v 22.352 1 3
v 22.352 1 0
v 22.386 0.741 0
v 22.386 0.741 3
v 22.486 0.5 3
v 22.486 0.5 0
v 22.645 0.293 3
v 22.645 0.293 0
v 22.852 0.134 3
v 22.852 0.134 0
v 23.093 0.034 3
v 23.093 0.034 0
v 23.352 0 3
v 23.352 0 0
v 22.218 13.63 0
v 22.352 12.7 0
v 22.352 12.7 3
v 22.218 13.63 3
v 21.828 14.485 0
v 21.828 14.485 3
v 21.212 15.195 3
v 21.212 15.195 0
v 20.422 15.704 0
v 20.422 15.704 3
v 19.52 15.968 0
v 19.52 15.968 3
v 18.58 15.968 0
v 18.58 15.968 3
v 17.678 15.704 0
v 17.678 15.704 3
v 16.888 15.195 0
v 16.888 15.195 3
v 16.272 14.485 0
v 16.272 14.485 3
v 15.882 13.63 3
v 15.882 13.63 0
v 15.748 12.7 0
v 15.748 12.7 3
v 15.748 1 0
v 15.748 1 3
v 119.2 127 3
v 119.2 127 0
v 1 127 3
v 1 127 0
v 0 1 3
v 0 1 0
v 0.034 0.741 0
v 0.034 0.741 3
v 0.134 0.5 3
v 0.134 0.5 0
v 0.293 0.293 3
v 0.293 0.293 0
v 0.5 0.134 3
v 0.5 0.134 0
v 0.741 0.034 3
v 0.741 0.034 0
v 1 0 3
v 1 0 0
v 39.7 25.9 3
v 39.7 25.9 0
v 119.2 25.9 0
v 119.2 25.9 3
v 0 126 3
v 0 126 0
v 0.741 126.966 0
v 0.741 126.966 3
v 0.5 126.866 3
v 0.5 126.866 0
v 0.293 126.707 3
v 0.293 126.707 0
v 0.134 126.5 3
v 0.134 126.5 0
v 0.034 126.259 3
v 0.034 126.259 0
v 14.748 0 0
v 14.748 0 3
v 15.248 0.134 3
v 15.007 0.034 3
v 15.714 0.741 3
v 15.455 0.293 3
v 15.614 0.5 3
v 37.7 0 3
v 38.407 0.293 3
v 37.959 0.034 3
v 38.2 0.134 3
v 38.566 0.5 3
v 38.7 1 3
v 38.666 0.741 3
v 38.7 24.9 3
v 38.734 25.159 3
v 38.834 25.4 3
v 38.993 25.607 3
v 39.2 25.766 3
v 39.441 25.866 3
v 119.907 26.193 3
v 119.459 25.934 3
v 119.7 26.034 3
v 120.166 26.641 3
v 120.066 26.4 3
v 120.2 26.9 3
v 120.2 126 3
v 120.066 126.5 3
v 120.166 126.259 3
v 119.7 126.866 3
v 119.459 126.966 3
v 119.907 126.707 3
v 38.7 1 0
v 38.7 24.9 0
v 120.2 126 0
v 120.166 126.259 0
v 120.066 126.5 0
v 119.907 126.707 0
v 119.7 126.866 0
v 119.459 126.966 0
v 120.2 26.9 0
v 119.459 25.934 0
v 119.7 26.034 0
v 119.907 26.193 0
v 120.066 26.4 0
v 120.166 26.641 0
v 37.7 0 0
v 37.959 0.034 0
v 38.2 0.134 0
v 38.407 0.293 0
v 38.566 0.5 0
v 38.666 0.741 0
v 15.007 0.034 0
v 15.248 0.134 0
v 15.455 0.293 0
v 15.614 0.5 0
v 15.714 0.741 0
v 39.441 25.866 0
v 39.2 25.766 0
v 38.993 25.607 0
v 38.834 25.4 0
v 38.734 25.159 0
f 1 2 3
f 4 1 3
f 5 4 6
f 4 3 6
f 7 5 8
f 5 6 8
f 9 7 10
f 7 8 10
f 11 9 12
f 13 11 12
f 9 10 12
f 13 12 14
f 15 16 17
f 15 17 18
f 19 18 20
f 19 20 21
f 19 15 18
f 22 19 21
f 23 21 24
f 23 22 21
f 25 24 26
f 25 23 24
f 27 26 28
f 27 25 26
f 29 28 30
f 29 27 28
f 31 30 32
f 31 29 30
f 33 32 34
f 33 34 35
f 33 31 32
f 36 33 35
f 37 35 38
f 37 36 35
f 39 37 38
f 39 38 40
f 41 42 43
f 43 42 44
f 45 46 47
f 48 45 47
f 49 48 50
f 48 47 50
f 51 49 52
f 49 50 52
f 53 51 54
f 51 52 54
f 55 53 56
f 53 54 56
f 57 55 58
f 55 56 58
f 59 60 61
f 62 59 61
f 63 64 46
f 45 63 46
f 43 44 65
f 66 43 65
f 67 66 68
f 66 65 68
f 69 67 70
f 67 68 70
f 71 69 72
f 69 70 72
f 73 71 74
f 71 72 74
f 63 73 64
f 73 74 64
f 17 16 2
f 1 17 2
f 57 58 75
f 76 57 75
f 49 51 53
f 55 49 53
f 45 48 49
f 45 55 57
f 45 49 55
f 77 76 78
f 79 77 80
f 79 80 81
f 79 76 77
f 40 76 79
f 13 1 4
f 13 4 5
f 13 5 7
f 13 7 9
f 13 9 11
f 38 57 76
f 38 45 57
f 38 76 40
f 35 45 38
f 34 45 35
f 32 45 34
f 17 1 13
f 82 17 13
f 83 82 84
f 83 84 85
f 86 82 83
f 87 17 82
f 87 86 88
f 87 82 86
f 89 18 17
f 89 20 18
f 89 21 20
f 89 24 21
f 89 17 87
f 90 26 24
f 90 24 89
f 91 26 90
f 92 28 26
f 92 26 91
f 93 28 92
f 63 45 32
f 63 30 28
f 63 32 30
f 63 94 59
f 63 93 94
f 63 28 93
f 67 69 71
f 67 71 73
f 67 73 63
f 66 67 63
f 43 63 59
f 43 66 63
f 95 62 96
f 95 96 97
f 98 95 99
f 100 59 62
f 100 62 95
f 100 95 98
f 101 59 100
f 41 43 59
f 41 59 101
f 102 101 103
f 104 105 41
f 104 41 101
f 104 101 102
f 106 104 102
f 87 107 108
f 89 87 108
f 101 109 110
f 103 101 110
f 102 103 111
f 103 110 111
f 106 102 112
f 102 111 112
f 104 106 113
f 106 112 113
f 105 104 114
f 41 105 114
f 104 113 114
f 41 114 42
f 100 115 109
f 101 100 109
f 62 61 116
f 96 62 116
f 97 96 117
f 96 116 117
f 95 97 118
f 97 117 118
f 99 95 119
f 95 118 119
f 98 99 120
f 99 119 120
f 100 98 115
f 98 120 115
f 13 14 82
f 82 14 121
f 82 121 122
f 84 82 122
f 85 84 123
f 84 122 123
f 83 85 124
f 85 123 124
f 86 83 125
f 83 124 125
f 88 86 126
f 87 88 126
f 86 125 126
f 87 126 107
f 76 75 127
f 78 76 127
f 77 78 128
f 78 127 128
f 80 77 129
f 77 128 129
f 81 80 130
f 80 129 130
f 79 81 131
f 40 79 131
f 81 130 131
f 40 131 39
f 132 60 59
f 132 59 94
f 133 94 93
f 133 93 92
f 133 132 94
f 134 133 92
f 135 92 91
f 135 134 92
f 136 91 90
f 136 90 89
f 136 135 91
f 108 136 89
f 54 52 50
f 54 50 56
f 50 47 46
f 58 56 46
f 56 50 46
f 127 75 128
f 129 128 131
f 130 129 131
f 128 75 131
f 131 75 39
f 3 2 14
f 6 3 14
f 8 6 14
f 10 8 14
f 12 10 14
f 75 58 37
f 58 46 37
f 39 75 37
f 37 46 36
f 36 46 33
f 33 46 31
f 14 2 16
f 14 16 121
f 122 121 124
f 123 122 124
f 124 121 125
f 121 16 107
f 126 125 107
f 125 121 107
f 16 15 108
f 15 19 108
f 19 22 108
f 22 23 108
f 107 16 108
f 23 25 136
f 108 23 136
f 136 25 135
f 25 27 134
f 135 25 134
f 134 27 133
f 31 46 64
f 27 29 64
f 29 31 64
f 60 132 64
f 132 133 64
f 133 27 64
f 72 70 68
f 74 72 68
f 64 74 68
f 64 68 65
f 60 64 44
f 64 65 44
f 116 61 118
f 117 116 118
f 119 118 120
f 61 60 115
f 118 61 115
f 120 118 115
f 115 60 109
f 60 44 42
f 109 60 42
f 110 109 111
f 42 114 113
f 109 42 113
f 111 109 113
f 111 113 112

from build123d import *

# Parameters (mm, degrees)
PAD_DEPTH = 3


with BuildPart() as part:
    # Sketch → Pad (new body)
    with BuildSketch(Plane.XY):
        with BuildLine():
            Line((0, 126), (0, 1))
            ThreePointArc((0, 1), (0.292893, 0.292893), (1, 0))
            Line((1, 0), (14.748, 0))
            ThreePointArc((14.748, 0), (15.455107, 0.292893), (15.748, 1))
            Line((15.748, 12.7), (15.748, 1))
            ThreePointArc((22.352, 12.7), (19.05, 16.002), (15.748, 12.7))
            Line((22.352, 12.7), (22.352, 1))
            ThreePointArc((22.352, 1), (22.644893, 0.292893), (23.352, 0))
            Line((23.352, 0), (37.7002, 0))
            ThreePointArc((37.7002, 0), (38.407307, 0.292893), (38.7002, 1))
            Line((38.7002, 1), (38.7002, 24.9))
            ThreePointArc((39.7002, 25.9), (38.993093, 25.607107), (38.7002, 24.9))
            Line((39.7002, 25.9), (119.2001, 25.9))
            ThreePointArc((119.2001, 25.9), (119.907207, 26.192893), (120.2001, 26.9))
            Line((120.2001, 26.9), (120.2001, 126))
            ThreePointArc((120.2001, 126), (119.907207, 126.707107), (119.2001, 127))
            Line((119.2001, 127), (1, 127))
            ThreePointArc((1, 127), (0.292893, 126.707107), (0, 126))
        make_face()
    extrude(amount=PAD_DEPTH)


solid = part.part
